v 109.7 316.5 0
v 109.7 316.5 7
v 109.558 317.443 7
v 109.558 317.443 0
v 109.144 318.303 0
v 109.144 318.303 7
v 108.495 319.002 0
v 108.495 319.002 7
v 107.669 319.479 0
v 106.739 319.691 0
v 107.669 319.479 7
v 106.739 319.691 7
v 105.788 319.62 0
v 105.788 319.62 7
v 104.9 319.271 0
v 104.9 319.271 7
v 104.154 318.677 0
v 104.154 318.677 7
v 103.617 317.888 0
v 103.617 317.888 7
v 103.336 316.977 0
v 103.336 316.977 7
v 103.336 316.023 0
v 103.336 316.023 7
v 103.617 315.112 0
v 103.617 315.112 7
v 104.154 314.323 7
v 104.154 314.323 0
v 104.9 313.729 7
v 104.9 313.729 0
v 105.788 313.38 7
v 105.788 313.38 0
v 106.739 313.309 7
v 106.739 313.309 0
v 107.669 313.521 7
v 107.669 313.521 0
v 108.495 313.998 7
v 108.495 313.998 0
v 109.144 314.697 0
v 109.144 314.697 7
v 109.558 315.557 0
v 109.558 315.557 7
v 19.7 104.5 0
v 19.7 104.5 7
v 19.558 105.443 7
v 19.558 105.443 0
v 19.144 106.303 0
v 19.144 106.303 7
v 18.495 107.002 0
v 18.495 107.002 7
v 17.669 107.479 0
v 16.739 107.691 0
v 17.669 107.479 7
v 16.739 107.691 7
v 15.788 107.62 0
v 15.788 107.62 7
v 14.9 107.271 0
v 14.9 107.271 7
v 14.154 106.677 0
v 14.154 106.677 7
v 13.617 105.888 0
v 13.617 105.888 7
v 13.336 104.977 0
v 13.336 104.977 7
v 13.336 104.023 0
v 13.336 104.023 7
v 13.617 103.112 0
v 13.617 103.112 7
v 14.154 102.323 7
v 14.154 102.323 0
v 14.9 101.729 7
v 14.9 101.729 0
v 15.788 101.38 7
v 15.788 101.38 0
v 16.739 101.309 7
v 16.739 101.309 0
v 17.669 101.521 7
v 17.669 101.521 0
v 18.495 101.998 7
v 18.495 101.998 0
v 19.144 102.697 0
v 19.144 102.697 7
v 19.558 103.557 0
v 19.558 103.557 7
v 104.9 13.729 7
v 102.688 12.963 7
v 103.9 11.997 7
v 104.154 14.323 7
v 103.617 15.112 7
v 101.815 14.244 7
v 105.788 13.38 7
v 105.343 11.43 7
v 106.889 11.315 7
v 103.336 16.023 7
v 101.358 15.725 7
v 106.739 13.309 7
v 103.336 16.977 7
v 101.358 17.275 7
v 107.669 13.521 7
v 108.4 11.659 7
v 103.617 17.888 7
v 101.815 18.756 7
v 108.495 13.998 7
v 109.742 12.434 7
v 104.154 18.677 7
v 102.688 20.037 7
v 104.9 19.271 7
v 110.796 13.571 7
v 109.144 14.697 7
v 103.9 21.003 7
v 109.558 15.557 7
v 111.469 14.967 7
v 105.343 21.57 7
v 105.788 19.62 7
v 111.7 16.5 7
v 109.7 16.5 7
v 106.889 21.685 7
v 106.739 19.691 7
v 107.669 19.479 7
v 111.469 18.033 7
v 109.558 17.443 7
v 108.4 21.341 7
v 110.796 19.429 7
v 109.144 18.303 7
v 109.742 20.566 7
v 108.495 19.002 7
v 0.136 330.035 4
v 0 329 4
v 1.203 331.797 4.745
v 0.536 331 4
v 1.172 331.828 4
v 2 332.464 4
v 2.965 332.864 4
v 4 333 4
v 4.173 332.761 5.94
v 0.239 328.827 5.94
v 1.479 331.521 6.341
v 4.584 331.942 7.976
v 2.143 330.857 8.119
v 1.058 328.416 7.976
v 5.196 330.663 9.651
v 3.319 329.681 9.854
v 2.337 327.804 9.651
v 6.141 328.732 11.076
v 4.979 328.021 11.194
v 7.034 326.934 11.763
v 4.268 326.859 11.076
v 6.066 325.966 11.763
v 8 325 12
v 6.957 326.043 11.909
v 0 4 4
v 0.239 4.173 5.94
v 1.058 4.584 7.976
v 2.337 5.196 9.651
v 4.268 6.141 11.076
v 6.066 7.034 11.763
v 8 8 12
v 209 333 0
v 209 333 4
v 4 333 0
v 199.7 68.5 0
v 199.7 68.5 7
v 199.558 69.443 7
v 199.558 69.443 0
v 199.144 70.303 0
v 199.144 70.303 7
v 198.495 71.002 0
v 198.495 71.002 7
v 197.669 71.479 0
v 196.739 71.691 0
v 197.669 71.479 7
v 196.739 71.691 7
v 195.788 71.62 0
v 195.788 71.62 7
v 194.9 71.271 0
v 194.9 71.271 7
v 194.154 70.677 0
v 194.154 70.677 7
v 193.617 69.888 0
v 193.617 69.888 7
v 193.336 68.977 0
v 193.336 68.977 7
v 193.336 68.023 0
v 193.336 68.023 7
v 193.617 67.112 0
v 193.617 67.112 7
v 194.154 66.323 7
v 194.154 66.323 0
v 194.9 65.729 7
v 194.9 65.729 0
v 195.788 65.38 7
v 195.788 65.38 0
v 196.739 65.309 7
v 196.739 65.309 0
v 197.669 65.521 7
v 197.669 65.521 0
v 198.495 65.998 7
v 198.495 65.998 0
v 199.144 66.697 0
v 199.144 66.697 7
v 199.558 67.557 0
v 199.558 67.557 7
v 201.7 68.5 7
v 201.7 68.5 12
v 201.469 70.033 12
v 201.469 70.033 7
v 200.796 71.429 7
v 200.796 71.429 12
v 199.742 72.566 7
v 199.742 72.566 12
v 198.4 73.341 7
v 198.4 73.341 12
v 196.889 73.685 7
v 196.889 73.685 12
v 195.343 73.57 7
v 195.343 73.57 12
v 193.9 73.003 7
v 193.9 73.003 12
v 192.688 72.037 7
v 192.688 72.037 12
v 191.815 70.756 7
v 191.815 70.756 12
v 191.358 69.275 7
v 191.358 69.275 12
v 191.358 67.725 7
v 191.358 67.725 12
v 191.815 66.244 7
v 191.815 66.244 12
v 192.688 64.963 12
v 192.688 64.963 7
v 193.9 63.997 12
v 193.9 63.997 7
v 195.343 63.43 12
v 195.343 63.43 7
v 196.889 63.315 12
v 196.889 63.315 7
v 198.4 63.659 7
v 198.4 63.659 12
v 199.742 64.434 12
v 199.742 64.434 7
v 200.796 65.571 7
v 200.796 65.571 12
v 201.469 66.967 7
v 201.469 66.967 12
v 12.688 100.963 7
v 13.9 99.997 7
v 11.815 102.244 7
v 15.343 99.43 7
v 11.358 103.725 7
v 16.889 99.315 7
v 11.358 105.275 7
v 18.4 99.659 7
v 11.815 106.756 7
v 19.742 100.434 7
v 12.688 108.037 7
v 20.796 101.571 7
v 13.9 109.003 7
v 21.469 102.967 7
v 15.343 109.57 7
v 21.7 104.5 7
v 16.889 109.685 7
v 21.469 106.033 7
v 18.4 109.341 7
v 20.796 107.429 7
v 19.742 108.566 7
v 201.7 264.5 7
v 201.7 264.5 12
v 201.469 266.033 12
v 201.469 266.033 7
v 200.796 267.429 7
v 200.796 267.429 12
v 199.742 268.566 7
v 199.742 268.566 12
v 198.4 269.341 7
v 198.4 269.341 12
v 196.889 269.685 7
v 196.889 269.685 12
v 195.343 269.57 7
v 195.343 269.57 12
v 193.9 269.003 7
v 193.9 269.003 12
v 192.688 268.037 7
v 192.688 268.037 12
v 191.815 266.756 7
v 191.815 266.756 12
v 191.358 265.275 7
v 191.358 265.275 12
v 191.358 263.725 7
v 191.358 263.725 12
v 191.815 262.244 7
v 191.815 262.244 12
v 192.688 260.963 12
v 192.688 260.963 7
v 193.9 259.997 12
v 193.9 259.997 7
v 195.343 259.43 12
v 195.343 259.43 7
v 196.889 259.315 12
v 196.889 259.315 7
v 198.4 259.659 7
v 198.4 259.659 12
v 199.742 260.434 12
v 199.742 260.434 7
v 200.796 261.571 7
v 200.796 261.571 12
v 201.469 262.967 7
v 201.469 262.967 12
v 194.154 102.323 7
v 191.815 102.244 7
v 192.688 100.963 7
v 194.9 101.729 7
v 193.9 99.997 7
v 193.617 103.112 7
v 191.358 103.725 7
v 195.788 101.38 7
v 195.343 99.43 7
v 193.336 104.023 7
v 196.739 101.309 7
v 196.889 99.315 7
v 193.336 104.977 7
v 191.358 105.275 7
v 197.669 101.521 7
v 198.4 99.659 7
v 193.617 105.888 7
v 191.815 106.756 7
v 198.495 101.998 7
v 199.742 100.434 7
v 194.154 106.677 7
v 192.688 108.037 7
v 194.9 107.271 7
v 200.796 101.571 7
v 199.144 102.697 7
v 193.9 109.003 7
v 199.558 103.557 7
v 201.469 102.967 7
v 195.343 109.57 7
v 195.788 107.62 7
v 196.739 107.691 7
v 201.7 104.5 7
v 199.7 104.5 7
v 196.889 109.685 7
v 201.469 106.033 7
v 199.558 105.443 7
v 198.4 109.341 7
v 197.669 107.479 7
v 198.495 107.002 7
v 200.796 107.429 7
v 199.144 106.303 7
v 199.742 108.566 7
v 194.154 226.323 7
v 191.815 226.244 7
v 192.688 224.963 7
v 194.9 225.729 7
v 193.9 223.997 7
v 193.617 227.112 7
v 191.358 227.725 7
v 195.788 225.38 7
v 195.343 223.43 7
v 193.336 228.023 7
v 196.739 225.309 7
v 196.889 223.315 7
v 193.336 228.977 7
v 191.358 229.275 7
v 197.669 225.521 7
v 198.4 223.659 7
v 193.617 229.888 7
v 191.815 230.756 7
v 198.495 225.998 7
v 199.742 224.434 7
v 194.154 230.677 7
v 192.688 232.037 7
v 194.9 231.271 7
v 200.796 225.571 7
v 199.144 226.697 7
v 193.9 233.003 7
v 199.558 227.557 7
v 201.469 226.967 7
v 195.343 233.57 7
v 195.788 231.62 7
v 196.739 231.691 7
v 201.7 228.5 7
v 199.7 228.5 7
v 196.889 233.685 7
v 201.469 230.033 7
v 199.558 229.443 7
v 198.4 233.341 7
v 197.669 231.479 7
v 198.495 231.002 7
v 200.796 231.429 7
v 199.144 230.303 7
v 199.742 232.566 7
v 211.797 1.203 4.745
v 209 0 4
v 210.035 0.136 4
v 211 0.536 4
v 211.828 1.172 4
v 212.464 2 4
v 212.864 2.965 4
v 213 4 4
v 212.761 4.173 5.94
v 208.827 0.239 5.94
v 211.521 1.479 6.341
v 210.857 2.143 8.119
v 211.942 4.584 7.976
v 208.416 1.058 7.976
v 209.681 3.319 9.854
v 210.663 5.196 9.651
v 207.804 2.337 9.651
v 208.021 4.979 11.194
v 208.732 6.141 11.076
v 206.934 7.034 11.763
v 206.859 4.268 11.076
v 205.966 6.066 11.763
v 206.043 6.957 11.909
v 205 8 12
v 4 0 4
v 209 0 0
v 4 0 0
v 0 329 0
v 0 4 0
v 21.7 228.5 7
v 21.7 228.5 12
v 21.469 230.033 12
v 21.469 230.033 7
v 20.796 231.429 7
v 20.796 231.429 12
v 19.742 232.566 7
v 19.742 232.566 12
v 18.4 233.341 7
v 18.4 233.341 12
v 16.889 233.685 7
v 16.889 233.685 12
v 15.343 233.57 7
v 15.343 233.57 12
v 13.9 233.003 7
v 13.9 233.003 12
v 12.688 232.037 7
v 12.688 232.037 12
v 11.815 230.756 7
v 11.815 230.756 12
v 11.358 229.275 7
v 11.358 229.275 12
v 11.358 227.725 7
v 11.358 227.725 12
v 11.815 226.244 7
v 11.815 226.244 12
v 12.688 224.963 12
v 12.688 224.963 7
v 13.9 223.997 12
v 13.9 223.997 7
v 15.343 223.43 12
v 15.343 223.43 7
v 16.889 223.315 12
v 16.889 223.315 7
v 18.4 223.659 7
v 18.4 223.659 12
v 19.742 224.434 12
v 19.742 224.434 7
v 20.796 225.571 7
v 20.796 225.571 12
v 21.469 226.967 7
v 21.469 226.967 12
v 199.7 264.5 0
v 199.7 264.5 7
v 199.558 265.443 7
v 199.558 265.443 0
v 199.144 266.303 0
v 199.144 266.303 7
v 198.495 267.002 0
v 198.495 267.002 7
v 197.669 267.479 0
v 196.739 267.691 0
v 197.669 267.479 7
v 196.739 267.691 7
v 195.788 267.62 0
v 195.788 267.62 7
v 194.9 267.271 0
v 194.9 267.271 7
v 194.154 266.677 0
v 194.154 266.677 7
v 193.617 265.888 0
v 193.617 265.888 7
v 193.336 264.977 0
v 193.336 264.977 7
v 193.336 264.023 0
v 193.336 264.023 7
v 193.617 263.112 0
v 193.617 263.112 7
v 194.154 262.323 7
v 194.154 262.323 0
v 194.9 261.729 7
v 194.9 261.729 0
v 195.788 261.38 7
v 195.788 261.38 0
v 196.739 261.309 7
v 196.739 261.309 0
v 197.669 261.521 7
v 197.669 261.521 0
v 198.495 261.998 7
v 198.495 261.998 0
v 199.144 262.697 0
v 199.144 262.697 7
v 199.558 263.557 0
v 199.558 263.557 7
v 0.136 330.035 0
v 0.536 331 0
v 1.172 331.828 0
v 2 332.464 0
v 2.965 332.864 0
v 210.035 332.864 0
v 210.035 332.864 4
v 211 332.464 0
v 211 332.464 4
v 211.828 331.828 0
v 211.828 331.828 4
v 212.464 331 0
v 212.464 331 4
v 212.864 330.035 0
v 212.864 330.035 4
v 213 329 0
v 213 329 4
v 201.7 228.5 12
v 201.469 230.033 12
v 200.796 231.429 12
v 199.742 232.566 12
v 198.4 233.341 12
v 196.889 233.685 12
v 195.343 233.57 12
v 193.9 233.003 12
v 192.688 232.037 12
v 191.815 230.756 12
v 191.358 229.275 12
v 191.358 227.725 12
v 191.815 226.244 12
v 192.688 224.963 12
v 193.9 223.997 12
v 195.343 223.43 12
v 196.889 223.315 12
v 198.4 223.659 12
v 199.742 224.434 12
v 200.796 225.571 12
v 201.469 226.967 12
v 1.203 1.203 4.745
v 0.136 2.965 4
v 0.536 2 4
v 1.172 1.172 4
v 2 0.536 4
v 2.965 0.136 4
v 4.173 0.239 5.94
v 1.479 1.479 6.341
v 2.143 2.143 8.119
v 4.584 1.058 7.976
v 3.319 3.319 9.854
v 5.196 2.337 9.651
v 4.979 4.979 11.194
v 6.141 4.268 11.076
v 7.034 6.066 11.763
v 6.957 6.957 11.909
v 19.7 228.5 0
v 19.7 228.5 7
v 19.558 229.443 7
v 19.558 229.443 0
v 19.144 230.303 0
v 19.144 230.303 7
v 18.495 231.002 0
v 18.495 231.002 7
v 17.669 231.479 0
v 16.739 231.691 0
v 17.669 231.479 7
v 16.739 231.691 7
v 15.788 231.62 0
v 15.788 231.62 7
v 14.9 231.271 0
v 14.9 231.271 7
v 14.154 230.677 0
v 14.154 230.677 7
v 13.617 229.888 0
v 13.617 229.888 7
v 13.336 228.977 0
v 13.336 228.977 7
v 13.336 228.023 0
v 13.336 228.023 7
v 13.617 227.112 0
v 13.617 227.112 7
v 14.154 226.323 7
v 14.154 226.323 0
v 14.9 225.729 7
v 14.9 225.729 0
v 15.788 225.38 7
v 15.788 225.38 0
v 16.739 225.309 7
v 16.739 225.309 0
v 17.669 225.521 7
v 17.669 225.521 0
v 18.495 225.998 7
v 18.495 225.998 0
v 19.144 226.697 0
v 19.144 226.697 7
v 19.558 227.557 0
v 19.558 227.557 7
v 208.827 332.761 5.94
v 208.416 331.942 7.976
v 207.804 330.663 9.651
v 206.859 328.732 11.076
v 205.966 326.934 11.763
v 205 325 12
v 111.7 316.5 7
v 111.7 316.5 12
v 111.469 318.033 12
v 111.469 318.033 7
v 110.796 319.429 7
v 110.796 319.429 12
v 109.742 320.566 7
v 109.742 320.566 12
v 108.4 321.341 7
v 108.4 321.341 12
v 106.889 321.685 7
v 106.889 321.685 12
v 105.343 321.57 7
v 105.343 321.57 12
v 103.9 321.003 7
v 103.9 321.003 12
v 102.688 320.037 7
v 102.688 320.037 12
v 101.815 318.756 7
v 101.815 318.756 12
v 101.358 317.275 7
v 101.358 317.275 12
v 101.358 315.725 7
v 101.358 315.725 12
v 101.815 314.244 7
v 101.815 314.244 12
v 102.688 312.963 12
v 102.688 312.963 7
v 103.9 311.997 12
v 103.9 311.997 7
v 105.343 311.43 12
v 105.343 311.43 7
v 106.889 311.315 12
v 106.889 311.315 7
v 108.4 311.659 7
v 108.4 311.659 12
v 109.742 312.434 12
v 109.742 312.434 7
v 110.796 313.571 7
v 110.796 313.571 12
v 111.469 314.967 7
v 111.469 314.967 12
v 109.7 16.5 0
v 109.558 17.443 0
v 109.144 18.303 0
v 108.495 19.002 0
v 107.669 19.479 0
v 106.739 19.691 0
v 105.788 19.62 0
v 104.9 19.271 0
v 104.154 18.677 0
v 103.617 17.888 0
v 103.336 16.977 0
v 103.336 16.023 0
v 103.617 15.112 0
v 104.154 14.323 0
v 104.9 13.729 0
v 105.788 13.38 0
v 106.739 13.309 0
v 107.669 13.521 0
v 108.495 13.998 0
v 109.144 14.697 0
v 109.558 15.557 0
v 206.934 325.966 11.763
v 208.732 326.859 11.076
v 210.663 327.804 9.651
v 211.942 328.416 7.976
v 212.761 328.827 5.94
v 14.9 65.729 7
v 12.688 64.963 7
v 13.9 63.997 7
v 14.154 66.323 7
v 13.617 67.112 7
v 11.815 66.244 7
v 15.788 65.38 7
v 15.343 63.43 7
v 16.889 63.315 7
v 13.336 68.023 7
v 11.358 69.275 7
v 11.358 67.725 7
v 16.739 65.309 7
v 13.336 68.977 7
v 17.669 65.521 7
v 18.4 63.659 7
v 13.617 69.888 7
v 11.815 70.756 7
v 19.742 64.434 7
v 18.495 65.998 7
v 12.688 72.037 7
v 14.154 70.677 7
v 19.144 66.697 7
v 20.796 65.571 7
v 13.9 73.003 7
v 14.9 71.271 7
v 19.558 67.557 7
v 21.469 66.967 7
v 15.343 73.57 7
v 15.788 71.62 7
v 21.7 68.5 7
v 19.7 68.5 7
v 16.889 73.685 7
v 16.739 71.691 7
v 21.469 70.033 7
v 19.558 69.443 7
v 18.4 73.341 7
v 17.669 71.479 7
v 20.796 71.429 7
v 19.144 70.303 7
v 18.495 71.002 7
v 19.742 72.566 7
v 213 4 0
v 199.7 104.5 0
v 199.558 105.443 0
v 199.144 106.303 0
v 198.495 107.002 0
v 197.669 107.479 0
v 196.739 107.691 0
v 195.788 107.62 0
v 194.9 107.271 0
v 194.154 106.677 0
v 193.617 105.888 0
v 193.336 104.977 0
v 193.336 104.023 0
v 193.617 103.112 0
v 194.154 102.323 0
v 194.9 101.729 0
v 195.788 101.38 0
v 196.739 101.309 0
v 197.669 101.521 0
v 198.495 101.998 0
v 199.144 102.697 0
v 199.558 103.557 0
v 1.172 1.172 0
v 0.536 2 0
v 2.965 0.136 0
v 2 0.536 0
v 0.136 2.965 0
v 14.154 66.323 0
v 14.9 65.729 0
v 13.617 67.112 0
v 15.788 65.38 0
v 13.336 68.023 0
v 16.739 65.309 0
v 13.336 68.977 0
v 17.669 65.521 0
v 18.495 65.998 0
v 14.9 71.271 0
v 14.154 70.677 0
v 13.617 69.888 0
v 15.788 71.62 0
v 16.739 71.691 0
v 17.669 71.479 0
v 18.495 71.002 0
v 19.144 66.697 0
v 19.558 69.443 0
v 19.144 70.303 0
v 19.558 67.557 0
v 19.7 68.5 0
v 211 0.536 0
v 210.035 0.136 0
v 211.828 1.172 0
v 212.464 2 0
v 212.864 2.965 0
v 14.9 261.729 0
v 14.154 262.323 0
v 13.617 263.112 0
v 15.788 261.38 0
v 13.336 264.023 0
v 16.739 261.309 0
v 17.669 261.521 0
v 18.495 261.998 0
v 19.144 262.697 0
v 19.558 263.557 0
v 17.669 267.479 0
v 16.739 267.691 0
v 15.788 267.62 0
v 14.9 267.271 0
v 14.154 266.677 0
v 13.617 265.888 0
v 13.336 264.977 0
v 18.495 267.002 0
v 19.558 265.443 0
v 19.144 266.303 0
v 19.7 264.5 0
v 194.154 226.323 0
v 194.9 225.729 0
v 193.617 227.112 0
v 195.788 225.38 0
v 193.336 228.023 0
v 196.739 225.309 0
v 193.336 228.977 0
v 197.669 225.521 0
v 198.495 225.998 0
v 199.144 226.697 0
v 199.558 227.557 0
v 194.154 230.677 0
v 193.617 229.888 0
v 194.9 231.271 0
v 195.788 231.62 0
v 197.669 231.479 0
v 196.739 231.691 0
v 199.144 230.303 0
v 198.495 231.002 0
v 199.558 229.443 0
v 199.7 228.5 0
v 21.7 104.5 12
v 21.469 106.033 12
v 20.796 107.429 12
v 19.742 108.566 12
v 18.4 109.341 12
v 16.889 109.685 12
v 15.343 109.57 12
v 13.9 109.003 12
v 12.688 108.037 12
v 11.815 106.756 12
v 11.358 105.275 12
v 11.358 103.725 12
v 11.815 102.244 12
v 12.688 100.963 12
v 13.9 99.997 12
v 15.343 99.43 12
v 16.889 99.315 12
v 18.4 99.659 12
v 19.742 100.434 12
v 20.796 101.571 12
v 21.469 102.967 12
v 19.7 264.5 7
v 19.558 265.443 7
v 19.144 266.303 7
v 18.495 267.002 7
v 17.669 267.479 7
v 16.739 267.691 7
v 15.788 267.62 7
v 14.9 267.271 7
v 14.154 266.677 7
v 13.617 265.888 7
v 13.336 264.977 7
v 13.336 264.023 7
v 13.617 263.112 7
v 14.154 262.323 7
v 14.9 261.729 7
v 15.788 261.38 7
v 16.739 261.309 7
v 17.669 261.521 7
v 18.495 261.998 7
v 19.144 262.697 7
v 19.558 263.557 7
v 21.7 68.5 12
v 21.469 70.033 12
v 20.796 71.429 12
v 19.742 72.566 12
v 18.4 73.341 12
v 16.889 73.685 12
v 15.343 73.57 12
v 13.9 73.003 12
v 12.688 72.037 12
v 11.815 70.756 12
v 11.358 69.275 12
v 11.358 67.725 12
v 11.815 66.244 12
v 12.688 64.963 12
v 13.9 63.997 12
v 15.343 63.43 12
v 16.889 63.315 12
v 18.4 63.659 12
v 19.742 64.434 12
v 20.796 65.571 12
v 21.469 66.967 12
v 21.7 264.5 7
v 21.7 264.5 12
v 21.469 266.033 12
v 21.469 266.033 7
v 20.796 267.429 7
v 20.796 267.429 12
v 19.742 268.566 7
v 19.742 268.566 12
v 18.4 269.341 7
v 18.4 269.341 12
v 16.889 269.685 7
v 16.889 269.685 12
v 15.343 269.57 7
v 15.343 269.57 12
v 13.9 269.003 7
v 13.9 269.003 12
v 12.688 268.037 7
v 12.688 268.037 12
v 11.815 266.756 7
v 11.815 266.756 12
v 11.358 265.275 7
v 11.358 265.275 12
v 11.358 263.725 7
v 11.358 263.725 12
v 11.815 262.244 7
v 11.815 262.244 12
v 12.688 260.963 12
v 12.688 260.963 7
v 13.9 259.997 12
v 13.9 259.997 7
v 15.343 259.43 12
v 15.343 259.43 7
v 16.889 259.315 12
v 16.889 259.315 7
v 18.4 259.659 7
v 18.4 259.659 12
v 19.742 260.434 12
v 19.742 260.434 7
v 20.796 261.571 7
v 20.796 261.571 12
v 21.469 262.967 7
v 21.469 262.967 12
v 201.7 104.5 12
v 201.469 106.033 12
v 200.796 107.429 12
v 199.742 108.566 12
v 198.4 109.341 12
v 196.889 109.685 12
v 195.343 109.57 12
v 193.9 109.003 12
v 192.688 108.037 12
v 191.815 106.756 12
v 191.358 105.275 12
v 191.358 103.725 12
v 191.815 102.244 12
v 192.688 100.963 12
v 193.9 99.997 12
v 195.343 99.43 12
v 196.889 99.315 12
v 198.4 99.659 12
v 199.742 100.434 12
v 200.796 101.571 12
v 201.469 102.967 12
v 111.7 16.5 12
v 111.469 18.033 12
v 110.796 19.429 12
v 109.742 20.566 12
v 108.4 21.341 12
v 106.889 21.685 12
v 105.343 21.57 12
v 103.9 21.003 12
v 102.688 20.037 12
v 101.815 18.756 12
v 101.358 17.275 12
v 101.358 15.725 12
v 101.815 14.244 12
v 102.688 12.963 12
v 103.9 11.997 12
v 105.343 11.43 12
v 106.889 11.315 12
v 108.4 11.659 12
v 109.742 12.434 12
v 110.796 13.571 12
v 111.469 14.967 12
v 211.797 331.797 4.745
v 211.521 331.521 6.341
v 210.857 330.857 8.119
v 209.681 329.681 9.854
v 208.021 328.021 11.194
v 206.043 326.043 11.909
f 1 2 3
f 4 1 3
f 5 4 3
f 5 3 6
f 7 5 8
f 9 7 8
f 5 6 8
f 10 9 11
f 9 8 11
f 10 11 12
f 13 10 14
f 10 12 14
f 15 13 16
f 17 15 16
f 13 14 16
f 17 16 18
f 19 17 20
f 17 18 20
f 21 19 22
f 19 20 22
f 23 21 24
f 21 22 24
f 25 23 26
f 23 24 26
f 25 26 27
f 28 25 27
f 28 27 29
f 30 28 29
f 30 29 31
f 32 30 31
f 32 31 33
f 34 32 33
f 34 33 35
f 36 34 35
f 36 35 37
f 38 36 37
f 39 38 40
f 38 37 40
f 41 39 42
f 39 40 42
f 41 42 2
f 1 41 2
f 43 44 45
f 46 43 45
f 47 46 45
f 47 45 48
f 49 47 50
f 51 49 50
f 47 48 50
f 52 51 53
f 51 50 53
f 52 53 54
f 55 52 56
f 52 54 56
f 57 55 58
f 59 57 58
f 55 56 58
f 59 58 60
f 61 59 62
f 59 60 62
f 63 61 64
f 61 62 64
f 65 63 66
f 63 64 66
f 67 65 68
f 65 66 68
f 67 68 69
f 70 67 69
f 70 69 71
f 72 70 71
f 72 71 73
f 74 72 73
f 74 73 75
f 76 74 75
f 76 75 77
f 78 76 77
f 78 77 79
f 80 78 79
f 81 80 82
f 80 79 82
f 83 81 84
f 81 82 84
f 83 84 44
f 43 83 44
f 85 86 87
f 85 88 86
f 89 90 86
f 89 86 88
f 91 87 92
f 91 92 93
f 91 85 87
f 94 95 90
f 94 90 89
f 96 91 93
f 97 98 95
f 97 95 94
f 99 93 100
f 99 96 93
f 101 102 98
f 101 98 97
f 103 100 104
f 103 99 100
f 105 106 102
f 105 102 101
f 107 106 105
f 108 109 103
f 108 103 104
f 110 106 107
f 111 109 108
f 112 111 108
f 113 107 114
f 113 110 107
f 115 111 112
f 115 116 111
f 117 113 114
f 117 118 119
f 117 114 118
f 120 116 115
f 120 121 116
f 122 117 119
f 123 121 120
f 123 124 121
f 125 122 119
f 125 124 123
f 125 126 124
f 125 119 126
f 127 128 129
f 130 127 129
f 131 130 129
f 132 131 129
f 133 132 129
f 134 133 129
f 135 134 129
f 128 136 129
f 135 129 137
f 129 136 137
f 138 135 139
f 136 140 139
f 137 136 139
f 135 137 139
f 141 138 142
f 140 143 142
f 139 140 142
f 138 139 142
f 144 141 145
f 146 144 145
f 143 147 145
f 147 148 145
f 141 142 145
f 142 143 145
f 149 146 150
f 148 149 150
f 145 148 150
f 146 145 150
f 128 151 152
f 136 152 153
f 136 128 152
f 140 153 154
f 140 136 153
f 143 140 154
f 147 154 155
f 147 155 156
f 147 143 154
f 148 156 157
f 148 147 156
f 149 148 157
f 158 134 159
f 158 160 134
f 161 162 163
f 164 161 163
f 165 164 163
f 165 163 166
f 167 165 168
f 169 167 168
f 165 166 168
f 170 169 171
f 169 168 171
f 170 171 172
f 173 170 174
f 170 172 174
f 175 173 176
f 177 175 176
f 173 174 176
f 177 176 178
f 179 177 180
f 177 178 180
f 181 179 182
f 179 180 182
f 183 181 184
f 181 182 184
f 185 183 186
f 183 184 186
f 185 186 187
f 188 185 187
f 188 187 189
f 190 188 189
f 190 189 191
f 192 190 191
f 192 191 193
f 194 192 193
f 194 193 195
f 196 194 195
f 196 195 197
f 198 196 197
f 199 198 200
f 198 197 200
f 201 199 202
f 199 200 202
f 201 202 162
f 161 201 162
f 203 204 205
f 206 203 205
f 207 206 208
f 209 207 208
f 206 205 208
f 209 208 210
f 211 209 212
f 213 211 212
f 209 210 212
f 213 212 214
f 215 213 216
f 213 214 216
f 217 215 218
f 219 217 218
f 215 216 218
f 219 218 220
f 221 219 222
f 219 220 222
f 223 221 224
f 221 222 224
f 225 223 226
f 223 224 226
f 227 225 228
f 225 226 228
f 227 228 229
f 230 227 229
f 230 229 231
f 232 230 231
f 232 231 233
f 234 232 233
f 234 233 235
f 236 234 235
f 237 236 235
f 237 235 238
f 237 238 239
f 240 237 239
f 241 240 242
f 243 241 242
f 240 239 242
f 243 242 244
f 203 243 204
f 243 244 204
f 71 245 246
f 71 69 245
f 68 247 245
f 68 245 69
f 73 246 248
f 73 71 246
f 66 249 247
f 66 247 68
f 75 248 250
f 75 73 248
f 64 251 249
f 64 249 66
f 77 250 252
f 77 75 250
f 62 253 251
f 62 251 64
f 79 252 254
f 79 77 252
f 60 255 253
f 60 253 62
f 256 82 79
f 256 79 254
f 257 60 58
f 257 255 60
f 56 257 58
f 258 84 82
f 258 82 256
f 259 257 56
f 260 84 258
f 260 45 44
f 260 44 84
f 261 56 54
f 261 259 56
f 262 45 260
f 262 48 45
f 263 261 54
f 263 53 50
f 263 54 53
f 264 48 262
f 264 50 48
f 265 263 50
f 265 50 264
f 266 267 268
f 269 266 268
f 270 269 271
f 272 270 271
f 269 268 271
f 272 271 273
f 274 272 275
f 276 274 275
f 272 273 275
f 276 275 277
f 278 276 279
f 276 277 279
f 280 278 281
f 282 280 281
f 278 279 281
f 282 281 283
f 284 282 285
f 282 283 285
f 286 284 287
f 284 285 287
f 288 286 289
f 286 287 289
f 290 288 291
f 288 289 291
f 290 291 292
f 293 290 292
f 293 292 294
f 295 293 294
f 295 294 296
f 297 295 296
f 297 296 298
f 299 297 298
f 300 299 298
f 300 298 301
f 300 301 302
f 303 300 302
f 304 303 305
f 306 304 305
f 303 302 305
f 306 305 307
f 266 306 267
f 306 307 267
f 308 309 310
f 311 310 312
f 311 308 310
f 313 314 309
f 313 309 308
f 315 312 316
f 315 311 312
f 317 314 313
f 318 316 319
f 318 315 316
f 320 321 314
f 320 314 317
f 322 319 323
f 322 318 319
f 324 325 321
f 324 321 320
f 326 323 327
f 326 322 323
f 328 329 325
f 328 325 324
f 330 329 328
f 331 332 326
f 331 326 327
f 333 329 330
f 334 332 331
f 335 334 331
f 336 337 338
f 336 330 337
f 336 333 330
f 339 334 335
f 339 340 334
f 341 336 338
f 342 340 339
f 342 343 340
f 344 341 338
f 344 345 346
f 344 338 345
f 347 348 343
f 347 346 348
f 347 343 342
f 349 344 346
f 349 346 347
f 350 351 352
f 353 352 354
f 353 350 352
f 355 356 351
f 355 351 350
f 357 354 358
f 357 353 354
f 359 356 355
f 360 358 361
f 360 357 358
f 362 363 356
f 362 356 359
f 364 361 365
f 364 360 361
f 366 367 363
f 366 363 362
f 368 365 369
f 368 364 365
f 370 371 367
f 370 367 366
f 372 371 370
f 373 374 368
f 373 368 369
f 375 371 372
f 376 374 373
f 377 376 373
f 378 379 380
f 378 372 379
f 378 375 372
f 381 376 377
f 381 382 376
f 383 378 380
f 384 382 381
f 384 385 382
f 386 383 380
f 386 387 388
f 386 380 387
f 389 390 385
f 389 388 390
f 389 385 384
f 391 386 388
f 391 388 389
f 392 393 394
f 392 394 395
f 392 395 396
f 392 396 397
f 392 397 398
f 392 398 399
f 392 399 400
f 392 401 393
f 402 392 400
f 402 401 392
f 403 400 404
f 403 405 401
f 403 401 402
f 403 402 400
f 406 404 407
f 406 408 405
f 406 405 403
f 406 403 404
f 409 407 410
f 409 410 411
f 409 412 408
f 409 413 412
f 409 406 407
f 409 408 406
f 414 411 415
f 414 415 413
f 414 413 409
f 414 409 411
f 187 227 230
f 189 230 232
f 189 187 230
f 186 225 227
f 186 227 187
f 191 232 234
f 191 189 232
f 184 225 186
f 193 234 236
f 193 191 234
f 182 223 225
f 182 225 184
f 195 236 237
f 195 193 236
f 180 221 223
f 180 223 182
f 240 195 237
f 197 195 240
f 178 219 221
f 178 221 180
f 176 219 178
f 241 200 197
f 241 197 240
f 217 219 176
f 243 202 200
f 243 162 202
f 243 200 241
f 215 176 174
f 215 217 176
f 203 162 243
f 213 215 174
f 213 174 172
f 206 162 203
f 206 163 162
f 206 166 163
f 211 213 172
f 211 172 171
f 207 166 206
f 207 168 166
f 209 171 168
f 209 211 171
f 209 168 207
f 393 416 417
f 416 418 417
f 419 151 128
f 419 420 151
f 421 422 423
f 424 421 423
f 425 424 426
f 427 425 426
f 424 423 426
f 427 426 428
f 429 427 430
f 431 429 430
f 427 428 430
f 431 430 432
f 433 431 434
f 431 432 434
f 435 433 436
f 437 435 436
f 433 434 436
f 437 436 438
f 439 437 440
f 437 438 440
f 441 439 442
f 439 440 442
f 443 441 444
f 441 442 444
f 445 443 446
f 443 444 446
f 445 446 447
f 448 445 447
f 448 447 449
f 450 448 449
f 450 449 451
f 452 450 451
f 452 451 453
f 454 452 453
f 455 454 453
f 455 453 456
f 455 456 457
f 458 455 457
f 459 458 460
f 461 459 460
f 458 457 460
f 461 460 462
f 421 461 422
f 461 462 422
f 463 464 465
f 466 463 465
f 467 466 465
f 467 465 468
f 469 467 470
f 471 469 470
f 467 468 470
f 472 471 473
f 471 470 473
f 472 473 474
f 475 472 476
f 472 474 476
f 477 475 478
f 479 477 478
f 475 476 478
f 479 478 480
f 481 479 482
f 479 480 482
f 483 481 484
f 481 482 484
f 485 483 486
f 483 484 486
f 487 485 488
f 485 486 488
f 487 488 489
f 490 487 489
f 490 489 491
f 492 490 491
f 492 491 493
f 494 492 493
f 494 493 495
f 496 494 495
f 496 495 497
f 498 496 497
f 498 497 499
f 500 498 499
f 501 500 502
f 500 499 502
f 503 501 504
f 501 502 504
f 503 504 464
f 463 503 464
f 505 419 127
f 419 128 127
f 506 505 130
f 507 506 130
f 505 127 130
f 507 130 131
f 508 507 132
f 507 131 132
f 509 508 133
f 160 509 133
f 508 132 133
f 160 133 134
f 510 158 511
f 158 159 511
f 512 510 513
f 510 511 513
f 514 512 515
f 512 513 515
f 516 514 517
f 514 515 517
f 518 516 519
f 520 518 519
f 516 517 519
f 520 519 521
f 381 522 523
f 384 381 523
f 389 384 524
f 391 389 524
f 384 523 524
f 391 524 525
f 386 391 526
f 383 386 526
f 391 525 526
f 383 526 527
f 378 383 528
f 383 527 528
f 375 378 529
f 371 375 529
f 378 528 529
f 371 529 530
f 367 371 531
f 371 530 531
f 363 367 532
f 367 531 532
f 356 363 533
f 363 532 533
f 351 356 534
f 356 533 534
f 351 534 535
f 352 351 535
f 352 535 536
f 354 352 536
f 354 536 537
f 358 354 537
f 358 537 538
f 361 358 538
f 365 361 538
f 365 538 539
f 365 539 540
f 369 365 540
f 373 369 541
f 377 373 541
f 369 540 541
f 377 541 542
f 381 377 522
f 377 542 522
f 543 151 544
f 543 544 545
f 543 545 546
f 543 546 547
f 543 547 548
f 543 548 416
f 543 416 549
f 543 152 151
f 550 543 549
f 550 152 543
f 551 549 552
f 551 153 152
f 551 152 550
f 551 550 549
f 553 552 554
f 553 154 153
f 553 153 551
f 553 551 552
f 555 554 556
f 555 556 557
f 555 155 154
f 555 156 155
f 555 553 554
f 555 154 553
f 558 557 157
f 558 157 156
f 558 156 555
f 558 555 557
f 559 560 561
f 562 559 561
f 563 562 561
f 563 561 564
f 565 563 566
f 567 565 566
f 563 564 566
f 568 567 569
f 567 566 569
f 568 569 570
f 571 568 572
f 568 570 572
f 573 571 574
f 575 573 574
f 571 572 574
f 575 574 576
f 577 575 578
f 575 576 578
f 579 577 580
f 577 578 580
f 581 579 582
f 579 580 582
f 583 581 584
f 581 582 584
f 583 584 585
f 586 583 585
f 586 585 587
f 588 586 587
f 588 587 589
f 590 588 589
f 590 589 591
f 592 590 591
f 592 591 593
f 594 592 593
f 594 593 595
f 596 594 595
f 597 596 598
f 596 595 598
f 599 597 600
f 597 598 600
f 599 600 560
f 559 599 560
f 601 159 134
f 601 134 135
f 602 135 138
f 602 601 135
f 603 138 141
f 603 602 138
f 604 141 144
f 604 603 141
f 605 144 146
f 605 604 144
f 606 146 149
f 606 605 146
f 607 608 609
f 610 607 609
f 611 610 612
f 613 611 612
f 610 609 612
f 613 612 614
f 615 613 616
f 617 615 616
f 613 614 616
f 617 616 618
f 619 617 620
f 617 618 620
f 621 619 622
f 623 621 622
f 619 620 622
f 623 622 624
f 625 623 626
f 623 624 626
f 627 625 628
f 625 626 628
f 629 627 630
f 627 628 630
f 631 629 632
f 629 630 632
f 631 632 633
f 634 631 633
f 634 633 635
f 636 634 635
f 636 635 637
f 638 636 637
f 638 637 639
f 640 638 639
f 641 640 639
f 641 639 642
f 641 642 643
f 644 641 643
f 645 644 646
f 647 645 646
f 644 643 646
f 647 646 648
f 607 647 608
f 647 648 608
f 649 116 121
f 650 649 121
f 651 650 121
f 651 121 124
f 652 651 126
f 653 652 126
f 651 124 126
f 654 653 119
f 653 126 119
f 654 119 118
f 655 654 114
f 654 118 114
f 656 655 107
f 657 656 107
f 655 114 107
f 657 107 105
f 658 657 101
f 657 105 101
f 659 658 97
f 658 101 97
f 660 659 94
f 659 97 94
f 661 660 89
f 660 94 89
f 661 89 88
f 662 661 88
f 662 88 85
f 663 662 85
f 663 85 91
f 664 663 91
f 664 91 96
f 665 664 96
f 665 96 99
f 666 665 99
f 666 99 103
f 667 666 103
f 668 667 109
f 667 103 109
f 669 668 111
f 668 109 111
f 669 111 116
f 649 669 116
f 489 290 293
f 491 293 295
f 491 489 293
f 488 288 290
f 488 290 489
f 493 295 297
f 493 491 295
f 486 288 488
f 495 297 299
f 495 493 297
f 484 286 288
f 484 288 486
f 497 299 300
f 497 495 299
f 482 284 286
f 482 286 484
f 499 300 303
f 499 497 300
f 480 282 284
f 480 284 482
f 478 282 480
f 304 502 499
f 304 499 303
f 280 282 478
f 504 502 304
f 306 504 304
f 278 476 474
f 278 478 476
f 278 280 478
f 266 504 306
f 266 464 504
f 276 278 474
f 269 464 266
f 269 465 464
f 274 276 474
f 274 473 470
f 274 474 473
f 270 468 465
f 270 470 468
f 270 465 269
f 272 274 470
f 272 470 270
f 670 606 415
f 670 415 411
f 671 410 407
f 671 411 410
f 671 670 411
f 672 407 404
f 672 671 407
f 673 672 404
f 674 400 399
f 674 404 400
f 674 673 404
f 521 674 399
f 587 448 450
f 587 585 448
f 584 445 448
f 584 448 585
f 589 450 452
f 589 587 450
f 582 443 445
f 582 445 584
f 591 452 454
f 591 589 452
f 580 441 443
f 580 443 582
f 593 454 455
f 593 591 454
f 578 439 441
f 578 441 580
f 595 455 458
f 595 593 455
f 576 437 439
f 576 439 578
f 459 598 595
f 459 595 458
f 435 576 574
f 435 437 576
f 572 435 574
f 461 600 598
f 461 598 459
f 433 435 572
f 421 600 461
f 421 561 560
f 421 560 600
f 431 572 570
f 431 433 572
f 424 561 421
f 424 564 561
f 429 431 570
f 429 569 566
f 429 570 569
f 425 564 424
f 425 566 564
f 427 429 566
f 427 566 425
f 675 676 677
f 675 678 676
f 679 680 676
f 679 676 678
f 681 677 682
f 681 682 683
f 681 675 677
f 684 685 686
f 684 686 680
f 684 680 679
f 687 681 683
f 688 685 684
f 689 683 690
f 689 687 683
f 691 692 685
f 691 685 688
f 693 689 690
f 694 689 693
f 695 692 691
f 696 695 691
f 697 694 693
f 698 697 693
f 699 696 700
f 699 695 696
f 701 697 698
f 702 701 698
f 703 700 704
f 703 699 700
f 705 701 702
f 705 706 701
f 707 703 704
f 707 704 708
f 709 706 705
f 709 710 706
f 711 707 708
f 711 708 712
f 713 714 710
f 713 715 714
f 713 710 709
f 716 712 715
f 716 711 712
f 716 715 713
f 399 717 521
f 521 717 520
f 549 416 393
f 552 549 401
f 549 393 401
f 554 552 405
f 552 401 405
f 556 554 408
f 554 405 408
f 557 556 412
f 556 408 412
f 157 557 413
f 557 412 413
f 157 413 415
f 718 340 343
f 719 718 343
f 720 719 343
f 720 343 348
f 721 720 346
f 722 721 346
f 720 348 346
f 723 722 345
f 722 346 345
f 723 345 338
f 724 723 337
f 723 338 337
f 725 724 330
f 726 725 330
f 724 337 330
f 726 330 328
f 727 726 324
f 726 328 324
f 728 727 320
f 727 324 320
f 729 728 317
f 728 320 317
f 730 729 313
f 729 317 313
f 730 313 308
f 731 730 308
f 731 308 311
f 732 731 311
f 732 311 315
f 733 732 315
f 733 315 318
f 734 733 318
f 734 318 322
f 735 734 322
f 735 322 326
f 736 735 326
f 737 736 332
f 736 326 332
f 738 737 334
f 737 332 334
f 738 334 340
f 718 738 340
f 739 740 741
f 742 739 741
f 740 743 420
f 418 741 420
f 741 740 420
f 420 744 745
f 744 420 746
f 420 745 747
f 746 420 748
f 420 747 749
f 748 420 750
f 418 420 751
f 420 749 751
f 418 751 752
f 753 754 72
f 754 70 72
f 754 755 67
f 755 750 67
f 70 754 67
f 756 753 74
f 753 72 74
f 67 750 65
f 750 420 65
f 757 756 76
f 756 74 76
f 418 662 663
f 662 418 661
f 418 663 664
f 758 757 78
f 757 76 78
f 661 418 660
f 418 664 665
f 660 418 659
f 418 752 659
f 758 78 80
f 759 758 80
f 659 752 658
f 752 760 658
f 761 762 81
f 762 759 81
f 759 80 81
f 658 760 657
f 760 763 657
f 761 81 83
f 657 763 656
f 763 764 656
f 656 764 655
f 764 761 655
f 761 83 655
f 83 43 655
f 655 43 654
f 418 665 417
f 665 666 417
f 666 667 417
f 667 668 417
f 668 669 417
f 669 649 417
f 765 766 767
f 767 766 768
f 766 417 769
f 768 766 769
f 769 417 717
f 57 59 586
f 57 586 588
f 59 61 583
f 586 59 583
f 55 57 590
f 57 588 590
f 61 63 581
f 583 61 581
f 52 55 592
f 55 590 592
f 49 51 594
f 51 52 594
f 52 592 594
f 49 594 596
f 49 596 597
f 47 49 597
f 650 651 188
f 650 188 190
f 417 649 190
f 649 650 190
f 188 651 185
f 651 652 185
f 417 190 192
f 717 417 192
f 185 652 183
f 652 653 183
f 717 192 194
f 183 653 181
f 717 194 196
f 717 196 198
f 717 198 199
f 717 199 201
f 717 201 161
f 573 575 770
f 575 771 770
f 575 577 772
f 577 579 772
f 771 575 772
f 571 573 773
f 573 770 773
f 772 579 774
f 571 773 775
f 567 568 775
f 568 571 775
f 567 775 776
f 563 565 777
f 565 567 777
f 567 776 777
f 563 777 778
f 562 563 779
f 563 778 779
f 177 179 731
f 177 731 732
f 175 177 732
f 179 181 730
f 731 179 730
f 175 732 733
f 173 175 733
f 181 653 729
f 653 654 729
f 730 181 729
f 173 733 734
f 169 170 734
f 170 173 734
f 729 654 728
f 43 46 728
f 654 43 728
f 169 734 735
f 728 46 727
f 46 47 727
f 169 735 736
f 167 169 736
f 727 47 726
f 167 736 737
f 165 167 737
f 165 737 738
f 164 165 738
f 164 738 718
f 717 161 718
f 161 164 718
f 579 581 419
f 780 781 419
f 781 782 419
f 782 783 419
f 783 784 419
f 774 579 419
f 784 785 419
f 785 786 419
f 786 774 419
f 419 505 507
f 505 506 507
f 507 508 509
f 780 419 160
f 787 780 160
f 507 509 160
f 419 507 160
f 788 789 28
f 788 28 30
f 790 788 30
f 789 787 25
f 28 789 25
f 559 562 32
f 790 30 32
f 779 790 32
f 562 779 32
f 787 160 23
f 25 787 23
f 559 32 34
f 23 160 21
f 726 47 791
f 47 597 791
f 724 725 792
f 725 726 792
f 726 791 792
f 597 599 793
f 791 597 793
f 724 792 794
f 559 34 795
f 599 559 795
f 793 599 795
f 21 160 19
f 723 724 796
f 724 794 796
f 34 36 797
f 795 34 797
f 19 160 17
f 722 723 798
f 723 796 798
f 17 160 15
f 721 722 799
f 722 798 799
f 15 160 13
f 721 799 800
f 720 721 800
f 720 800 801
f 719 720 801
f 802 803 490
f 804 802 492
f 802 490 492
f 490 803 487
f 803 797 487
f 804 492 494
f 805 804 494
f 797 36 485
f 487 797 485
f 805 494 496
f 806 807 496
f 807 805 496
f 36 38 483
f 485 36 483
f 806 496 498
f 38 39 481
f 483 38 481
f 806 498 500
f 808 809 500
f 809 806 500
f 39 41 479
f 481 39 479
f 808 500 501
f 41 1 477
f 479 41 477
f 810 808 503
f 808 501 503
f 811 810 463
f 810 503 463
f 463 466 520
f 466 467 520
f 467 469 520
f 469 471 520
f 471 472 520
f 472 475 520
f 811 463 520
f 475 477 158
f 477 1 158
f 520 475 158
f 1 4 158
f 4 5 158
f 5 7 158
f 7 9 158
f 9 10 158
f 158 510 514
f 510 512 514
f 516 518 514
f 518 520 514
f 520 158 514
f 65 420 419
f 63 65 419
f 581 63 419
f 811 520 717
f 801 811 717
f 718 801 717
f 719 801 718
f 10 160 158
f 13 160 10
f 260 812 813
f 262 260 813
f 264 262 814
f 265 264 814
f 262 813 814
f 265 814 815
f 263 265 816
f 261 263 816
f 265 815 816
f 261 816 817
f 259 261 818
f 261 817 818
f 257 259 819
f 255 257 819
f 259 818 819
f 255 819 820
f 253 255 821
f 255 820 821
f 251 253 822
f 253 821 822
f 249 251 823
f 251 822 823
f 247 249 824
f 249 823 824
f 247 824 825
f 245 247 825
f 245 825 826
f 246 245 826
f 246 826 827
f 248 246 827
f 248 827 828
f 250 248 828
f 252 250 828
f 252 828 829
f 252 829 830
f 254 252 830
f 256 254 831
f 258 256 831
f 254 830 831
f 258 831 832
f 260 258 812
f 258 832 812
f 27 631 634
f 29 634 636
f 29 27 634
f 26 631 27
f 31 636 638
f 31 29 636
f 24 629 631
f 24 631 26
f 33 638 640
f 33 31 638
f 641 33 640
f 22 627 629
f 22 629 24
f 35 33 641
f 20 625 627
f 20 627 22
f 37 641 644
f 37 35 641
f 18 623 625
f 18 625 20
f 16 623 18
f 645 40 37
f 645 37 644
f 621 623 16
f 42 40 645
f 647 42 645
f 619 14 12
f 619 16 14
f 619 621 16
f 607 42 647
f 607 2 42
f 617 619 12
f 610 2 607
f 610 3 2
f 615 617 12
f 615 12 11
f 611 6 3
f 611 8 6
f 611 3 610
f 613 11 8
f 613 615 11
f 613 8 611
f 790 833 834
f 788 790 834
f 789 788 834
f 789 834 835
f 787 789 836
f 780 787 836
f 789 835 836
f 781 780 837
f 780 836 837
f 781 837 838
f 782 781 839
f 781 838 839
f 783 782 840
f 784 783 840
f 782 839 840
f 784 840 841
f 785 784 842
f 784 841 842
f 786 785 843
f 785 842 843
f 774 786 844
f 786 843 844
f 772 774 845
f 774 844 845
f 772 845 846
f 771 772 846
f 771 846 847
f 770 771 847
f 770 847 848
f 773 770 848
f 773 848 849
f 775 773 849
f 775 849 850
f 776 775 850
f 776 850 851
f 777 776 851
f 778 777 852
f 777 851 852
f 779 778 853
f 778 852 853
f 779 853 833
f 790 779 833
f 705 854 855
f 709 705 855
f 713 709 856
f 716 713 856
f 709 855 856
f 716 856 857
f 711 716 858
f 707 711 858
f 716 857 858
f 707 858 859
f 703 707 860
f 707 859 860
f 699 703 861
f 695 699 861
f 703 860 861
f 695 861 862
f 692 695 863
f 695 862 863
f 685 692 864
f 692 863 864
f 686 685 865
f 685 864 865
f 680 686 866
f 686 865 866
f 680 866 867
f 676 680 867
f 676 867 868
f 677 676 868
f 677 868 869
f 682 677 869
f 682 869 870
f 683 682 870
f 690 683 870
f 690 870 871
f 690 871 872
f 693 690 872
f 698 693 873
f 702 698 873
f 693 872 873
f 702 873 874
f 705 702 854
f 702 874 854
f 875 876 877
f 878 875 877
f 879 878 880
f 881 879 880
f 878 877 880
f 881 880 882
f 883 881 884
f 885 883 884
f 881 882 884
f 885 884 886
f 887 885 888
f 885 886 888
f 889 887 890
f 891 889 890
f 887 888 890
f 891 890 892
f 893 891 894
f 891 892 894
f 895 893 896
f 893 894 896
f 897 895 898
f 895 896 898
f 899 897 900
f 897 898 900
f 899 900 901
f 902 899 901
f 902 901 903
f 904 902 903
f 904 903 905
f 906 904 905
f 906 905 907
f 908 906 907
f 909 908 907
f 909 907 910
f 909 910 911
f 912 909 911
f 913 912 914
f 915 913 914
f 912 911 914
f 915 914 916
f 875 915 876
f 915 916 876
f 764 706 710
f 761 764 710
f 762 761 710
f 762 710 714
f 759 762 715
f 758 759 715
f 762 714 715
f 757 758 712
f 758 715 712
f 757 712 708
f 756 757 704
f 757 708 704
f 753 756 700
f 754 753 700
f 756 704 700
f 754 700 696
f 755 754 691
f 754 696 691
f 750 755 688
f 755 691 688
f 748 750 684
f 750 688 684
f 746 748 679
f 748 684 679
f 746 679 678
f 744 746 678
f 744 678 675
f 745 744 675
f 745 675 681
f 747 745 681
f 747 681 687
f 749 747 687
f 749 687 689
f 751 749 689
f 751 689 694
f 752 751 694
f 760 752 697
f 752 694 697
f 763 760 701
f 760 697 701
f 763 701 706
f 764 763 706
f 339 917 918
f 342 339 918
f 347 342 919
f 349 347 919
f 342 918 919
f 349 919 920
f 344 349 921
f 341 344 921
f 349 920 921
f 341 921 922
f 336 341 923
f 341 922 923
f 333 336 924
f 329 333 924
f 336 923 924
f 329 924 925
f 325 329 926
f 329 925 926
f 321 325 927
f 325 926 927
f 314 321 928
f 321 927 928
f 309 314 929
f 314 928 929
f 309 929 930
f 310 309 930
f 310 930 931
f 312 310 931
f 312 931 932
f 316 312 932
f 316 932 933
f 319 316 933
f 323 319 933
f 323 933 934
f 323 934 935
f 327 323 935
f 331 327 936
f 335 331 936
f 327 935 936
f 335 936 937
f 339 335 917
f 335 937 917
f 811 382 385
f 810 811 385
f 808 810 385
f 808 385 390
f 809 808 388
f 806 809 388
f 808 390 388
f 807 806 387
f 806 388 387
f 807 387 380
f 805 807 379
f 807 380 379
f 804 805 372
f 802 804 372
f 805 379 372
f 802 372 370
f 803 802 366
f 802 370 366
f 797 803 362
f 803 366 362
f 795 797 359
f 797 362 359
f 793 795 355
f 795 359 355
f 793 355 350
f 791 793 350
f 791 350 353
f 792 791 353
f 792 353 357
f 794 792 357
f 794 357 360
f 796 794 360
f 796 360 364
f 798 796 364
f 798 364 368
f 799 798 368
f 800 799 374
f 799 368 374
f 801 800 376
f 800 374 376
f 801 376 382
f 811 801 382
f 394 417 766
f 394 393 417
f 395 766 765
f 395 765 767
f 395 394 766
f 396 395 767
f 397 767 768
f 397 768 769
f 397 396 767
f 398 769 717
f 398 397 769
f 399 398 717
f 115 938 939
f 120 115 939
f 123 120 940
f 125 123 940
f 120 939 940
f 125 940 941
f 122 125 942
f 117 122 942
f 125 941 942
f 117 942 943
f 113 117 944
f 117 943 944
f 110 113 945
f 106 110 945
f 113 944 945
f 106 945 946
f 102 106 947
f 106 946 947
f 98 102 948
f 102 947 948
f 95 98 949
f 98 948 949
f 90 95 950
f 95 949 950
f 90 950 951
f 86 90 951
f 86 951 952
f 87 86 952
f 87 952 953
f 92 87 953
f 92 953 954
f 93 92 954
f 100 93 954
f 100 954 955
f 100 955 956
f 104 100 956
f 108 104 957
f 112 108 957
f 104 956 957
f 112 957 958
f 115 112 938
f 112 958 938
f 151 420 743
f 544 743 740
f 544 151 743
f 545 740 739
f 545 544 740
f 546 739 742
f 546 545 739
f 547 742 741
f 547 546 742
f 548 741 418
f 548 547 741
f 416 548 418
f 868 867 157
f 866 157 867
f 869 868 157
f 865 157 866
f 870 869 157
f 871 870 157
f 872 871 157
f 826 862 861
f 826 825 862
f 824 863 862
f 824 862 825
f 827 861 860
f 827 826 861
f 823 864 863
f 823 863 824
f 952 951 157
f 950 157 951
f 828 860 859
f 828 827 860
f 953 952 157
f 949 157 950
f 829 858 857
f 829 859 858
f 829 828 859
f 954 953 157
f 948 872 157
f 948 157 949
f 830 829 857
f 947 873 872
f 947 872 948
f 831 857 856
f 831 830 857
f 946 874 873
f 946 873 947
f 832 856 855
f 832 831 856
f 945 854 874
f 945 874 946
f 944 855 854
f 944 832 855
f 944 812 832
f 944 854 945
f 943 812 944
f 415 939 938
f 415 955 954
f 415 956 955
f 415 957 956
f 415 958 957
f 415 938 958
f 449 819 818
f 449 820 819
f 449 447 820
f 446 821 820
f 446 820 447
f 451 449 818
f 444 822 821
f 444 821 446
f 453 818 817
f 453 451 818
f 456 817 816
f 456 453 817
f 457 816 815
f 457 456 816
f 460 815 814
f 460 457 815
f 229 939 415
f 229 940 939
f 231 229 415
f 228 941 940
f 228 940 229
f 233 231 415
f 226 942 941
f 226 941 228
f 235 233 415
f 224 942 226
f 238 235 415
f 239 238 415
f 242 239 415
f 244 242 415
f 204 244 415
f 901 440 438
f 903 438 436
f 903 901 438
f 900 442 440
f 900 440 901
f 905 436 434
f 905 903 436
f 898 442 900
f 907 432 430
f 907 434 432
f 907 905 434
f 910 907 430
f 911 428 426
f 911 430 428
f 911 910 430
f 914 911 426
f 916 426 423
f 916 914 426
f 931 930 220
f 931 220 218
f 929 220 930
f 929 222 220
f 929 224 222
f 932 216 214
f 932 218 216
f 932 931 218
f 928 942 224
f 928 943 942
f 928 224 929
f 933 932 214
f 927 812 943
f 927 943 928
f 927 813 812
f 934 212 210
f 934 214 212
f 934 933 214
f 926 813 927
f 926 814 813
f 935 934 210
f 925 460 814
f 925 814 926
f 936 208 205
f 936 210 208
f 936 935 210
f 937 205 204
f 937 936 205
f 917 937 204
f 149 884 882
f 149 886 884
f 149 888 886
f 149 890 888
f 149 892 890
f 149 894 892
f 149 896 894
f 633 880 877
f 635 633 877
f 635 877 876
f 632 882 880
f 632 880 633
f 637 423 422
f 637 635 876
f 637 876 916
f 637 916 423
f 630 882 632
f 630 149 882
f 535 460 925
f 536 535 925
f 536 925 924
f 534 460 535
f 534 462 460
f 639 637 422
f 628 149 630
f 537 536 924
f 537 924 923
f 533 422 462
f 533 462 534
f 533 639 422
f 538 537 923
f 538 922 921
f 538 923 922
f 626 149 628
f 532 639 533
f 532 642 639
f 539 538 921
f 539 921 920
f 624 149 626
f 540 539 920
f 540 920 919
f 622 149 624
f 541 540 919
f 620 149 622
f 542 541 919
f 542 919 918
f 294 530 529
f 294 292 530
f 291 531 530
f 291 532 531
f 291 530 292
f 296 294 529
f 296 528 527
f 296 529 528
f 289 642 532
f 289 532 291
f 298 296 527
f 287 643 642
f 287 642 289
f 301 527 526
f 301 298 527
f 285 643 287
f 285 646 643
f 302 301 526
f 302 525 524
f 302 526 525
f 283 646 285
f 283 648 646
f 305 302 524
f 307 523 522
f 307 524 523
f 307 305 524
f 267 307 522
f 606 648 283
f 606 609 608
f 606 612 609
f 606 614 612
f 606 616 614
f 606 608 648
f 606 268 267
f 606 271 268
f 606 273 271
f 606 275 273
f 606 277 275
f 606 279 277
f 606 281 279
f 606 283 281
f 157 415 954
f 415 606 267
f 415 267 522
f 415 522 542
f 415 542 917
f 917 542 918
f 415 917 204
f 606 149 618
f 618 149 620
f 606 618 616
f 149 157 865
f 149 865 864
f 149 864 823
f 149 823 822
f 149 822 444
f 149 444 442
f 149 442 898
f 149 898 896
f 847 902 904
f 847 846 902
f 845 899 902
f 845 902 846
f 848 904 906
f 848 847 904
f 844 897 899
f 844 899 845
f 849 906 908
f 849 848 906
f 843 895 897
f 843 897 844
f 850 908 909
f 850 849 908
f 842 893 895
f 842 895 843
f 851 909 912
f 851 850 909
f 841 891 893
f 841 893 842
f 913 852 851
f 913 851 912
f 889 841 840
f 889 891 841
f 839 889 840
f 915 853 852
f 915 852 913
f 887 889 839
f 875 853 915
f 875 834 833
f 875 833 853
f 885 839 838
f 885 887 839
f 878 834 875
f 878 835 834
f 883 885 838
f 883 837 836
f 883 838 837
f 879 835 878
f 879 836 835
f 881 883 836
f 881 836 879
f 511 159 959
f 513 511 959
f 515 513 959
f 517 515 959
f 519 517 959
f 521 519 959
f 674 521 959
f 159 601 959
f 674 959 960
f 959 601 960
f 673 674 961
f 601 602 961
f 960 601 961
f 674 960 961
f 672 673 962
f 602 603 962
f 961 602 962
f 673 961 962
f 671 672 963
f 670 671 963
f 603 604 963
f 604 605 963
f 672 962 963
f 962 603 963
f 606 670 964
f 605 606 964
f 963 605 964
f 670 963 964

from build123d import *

# Parameters (mm, degrees)
SKETCH_W        = 213
SKETCH_H        = 333
PAD_DEPTH       = 12
SKETCH001_R     = 5.2
POCKET_DEPTH    = 5
SKETCH002_R     = 3.2
POCKET001_DEPTH = 7
FILLET_R        = 8
FILLET001_R     = 4


with BuildPart() as part:
    # Sketch → Pad (new body)
    with BuildSketch(Plane.XY):
        with Locations((106.5, 166.5)):
            Rectangle(SKETCH_W, SKETCH_H)
    extrude(amount=PAD_DEPTH)

    # Sketch001 (on Face6 of Pad) → Pocket (cut)
    with BuildSketch(Plane.XY.offset(12)):
        with Locations((16.5, 264.5)):
            Circle(SKETCH001_R)
        with Locations((16.5, 228.5)):
            Circle(SKETCH001_R)
        with Locations((16.5, 104.5)):
            Circle(SKETCH001_R)
        with Locations((16.5, 68.5)):
            Circle(SKETCH001_R)
        with Locations((196.5, 264.5)):
            Circle(SKETCH001_R)
        with Locations((196.5, 228.5)):
            Circle(SKETCH001_R)
        with Locations((196.5, 104.5)):
            Circle(SKETCH001_R)
        with Locations((196.5, 68.5)):
            Circle(SKETCH001_R)
        with Locations((106.5, 316.5)):
            Circle(SKETCH001_R)
        with Locations((106.5, 16.5)):
            Circle(SKETCH001_R)
    extrude(amount=-POCKET_DEPTH, mode=Mode.SUBTRACT)

    # Sketch002 (on Face23 of Pocket) → Pocket001 (cut)
    with BuildSketch(Plane.XY.offset(7)):
        with Locations((106.5, 316.5)):
            Circle(SKETCH002_R)
        with Locations((16.5, 264.5)):
            Circle(SKETCH002_R)
        with Locations((16.5, 228.5)):
            Circle(SKETCH002_R)
        with Locations((16.5, 104.5)):
            Circle(SKETCH002_R)
        with Locations((16.5, 68.5)):
            Circle(SKETCH002_R)
        with Locations((106.5, 16.5)):
            Circle(SKETCH002_R)
        with Locations((196.5, 68.5)):
            Circle(SKETCH002_R)
        with Locations((196.5, 104.5)):
            Circle(SKETCH002_R)
        with Locations((196.5, 228.5)):
            Circle(SKETCH002_R)
        with Locations((196.5, 264.5)):
            Circle(SKETCH002_R)
    extrude(amount=-POCKET001_DEPTH, mode=Mode.SUBTRACT)

    # Fillet
    fillet_edges = [part.edges().sort_by_distance(p)[0] for p in [
        (106.5, 0, 12),
        (213, 166.5, 12),
        (106.5, 333, 12),
        (0, 166.5, 12),
    ]]
    fillet(fillet_edges, radius=FILLET_R)

    # Fillet001
    fillet001_edges = [part.edges().sort_by_distance(p)[0] for p in [
        (0, 0, 2),
        (2.831608, 2.831608, 10.106368),
        (213, 0, 2),
        (210.168391, 2.831609, 10.106368),
        (213, 333, 2),
        (210.168392, 330.168392, 10.106368),
        (0, 333, 2),
        (2.831609, 330.168391, 10.106368),
    ]]
    fillet(fillet001_edges, radius=FILLET001_R)


solid = part.part
